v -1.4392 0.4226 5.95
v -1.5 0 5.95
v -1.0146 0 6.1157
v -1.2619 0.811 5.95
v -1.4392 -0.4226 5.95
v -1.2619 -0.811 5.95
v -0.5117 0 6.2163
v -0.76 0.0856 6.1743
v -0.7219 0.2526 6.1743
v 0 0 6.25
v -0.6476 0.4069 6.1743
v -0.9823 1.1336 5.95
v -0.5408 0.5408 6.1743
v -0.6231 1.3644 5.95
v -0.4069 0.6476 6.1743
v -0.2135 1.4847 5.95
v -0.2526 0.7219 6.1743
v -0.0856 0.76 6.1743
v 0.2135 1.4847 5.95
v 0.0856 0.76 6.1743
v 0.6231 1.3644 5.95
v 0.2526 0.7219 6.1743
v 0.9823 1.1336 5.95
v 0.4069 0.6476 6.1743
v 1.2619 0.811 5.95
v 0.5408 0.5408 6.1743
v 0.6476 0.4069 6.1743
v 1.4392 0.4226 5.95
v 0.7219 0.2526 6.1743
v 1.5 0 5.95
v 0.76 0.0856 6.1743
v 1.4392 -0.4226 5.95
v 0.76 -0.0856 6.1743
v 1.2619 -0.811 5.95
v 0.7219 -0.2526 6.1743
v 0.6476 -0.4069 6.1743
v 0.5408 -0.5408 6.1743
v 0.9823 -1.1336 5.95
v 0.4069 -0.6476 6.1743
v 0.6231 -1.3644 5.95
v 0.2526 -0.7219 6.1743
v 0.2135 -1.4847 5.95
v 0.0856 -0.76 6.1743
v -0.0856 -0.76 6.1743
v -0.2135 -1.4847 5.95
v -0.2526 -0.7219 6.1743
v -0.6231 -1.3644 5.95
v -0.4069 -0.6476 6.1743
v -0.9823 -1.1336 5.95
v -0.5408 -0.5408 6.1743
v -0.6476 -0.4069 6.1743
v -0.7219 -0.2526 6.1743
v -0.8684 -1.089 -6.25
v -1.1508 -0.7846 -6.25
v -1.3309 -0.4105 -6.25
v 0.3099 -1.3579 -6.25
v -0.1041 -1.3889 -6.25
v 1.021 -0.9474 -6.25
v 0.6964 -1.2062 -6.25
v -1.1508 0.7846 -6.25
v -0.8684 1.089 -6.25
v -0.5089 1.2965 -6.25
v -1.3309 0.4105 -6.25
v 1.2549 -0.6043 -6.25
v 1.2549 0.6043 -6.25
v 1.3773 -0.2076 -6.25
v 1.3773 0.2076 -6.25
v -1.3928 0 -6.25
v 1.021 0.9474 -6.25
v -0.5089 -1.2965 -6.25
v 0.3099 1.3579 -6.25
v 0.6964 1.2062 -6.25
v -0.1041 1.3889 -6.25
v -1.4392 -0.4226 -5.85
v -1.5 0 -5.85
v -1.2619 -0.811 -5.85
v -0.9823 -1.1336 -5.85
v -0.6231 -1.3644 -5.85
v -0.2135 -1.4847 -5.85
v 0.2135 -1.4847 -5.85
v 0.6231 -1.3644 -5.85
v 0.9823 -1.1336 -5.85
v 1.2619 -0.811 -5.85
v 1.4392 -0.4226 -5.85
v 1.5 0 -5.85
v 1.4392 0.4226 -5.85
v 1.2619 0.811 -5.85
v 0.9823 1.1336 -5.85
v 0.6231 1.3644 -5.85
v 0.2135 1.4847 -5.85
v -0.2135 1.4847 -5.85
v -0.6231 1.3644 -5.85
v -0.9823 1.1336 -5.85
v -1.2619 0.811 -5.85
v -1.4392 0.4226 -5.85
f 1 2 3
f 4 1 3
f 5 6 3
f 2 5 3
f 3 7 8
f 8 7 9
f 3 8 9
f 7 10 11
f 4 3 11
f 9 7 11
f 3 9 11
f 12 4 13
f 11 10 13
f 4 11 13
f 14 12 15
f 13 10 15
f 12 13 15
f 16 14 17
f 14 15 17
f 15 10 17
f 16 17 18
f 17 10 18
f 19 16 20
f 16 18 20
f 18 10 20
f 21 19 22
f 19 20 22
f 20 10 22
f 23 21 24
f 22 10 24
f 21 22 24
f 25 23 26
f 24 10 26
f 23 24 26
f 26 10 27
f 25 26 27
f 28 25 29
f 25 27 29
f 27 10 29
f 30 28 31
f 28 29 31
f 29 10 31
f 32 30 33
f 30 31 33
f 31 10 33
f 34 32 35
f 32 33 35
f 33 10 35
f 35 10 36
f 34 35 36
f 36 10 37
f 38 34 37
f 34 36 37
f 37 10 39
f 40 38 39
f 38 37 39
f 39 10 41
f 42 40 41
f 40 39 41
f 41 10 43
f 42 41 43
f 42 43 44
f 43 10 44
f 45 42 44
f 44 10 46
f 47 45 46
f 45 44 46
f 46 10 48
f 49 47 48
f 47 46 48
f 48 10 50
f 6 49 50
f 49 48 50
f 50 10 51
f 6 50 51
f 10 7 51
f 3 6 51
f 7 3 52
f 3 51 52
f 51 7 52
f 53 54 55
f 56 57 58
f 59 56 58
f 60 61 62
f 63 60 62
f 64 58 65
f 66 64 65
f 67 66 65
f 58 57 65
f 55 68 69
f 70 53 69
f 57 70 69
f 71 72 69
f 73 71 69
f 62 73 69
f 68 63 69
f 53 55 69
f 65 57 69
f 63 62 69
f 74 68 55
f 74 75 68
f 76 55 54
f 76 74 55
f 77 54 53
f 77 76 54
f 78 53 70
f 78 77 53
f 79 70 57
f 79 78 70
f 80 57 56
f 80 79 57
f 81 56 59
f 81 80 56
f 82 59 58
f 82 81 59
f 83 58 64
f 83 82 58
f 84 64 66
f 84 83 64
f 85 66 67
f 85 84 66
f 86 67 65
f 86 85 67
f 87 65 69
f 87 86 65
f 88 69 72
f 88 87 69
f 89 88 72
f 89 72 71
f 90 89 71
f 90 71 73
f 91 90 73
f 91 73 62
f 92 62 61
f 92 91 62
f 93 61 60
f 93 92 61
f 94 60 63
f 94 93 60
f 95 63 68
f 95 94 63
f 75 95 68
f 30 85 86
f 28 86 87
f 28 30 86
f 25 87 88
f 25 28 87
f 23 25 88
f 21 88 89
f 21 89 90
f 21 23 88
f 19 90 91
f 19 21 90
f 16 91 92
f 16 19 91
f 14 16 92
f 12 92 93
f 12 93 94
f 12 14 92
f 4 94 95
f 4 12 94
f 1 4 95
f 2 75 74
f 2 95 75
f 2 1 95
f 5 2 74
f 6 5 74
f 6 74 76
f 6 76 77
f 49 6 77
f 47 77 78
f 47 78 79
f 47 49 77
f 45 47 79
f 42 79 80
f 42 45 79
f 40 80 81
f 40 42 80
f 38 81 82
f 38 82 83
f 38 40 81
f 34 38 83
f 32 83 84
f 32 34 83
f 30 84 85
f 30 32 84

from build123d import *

# Parameters (mm, degrees)
F0_R     = 1.5
F1_DEPTH = 6.25


with BuildPart() as f1:
    # F0 (on Top) → F1 (new body, symmetric)
    with BuildSketch(Plane.XY):
        Circle(F0_R)
    extrude(amount=F1_DEPTH, both=True)

    # F2 (on Front) → F3 (revolve, cut)
    with BuildSketch(Plane.XZ):
        with BuildLine():
            Line((-1.6585878329, 5.95), (-1.5, 5.95))
            ThreePointArc((-1.5, 5.95), (-0.764852927, 6.1742646352), (0, 6.25))
            Line((0, 6.25), (0, 6.3502374105))
            Line((0, 6.3502374105), (-1.6585878329, 6.3502374105))
            Line((-1.6585878329, 6.3502374105), (-1.6585878329, 6.25))
            Line((-1.6585878329, 6.25), (-1.6585878329, 5.95))
        make_face()
    revolve(axis=Axis((0, 0, 3.125), (0, 0, -1)), mode=Mode.SUBTRACT)

    # F4 (on Front) → F5 (revolve, cut)
    with BuildSketch(Plane.XZ):
        Polygon((-0.9272391541, -7.9875725775), (-1.5, -5.85), (-1.5, -7.9875725775), align=None)
    revolve(axis=Axis((0, 0, -6.25), (0, 0, 1)), mode=Mode.SUBTRACT)


solid = f1.part
